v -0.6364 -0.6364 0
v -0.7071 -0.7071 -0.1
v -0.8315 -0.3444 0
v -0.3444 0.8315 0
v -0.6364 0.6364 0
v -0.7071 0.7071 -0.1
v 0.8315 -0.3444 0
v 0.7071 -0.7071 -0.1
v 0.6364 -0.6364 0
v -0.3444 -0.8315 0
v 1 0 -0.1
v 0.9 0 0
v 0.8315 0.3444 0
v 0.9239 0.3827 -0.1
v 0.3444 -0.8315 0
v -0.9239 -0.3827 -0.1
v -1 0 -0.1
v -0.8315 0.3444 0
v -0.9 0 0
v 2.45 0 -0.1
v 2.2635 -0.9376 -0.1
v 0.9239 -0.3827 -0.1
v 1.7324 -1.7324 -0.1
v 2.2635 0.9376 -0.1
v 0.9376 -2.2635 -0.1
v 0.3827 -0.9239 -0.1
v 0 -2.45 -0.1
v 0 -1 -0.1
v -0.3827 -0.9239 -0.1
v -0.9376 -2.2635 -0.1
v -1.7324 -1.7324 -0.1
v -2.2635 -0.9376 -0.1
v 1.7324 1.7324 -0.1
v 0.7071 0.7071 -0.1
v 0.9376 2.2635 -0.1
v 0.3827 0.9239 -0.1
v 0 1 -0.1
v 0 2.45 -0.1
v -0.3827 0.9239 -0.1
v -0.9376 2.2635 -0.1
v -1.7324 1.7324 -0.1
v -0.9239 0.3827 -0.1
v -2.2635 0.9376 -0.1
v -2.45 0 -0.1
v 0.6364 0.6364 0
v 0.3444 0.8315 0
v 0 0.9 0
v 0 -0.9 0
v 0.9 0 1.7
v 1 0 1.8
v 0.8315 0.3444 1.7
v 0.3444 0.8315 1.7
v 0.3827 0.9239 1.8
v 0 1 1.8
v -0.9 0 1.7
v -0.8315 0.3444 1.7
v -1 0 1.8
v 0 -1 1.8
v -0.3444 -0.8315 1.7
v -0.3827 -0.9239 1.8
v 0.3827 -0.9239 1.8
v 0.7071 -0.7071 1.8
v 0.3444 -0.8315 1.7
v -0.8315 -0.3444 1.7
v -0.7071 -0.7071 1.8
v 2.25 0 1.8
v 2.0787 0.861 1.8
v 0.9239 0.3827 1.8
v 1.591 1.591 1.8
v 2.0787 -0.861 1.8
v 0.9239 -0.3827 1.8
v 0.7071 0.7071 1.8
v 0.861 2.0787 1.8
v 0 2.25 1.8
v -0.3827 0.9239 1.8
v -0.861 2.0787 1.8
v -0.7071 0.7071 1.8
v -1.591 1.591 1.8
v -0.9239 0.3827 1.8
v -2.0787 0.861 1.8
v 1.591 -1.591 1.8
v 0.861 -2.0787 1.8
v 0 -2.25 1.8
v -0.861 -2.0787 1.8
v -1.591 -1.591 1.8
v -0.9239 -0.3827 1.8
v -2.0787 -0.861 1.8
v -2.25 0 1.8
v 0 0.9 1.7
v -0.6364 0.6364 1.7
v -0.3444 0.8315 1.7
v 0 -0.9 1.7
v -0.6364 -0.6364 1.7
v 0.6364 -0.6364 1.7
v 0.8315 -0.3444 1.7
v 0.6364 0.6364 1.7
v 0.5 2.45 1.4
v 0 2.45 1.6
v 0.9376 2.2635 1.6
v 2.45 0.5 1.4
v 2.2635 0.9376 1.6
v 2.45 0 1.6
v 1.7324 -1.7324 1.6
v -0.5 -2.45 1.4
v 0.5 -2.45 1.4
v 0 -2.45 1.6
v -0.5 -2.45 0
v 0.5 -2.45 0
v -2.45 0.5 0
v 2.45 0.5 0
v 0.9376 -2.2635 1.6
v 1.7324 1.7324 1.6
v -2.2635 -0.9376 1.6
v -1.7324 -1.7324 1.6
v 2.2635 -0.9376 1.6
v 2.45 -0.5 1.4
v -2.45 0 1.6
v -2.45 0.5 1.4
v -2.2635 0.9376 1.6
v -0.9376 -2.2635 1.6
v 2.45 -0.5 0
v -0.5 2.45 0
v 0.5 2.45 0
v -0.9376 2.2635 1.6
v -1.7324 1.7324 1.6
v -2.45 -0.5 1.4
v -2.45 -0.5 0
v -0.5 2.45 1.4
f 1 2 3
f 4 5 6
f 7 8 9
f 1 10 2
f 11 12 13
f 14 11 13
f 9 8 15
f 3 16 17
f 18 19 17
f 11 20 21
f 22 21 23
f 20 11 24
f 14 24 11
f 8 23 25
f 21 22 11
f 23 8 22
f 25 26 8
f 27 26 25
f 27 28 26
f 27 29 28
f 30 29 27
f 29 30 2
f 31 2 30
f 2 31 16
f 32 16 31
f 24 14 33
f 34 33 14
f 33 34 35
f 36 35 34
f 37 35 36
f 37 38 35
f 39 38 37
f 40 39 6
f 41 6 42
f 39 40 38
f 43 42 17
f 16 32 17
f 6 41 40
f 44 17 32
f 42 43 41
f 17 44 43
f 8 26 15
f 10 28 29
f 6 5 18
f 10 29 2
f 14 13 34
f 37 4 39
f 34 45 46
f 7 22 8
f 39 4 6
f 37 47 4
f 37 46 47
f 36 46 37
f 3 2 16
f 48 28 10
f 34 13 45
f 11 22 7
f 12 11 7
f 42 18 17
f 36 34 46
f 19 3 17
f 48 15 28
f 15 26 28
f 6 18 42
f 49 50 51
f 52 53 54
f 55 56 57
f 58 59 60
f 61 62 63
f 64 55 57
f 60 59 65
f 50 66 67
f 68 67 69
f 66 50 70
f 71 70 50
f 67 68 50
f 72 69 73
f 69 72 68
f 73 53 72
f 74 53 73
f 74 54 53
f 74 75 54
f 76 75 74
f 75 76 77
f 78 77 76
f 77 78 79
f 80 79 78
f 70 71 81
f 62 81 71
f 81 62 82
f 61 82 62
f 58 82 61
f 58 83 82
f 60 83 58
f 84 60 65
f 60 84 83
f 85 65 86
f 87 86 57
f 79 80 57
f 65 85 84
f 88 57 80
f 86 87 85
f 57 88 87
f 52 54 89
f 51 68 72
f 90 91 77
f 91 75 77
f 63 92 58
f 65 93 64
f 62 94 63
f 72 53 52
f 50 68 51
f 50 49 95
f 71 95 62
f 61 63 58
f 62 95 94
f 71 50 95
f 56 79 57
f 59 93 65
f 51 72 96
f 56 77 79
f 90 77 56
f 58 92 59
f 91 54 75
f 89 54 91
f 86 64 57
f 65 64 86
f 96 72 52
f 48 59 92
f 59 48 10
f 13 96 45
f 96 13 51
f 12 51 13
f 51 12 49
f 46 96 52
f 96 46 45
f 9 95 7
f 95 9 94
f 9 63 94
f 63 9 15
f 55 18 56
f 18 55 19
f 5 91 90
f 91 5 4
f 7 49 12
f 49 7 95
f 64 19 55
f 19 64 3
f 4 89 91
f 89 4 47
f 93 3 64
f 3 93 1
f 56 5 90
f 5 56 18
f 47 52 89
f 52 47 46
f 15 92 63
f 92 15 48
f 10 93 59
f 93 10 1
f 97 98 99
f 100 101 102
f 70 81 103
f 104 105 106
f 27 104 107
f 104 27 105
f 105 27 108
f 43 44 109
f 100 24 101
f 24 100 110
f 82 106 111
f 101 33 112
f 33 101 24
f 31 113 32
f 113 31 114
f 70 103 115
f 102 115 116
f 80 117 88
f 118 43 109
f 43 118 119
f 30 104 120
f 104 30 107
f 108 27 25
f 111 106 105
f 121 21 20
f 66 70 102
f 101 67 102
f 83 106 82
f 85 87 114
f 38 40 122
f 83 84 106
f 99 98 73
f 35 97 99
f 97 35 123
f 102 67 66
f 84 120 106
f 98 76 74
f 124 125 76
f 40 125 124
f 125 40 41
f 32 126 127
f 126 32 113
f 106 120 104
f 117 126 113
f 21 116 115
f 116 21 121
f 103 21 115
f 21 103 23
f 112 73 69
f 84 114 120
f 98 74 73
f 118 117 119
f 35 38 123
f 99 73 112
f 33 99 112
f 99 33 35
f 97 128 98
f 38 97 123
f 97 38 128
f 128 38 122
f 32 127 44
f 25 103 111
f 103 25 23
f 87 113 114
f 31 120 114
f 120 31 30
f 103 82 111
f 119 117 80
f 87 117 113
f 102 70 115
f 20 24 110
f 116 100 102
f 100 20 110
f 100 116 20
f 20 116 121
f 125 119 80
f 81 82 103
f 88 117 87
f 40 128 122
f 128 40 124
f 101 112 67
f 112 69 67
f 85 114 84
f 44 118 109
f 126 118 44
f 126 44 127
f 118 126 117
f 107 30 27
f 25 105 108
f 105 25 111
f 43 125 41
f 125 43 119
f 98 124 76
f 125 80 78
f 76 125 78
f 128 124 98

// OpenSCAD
// Lego Compatible Build Modules

test_module="test lcbm_peg";

module lcbm_peg(peg_d=4.9,peg_h=1.8,peg_bevel=0.2,peg_base_ext=0.1,peg_hole_d=1.8,peg_hole_bevel=0.1,flat_side_w=1.0) {
    $fn=16;
    render() difference() {
        hull() {
            translate([0,0,-peg_base_ext]) cylinder(r=peg_d/2,h=peg_base_ext+peg_h-peg_bevel);
            if(flat_side_w>0.0) {
                translate([0,0,peg_h/2-peg_bevel]) {
                    cube([flat_side_w,peg_d,peg_h-2*peg_bevel],center=true);
                    cube([peg_d,flat_side_w,peg_h-2*peg_bevel],center=true);
                }
            }
            if(peg_bevel>0.0) {
                translate([0,0,peg_h-peg_bevel]) cylinder(r1=peg_d/2,r2=peg_d/2-peg_bevel,h=peg_bevel);
            }
        }
        if(peg_hole_d>0.0) {
            translate([0,0,-peg_base_ext]) {
                cylinder(r=peg_hole_d/2,h=peg_base_ext+peg_h);
            }
            if(peg_hole_bevel>0.0) {
                translate([0,0,-peg_base_ext]) cylinder(r1=peg_hole_d/2+peg_hole_bevel,r2=peg_hole_d/2,h=peg_hole_bevel);
                translate([0,0,peg_h-peg_hole_bevel]) cylinder(r1=peg_hole_d/2,r2=peg_hole_d/2+peg_hole_bevel,h=peg_hole_bevel);
            }
        }
    }
}

if(test_module=="test lcbm_peg") {
    echo("Testing lcbm_peg...");
    lcbm_peg();
}
